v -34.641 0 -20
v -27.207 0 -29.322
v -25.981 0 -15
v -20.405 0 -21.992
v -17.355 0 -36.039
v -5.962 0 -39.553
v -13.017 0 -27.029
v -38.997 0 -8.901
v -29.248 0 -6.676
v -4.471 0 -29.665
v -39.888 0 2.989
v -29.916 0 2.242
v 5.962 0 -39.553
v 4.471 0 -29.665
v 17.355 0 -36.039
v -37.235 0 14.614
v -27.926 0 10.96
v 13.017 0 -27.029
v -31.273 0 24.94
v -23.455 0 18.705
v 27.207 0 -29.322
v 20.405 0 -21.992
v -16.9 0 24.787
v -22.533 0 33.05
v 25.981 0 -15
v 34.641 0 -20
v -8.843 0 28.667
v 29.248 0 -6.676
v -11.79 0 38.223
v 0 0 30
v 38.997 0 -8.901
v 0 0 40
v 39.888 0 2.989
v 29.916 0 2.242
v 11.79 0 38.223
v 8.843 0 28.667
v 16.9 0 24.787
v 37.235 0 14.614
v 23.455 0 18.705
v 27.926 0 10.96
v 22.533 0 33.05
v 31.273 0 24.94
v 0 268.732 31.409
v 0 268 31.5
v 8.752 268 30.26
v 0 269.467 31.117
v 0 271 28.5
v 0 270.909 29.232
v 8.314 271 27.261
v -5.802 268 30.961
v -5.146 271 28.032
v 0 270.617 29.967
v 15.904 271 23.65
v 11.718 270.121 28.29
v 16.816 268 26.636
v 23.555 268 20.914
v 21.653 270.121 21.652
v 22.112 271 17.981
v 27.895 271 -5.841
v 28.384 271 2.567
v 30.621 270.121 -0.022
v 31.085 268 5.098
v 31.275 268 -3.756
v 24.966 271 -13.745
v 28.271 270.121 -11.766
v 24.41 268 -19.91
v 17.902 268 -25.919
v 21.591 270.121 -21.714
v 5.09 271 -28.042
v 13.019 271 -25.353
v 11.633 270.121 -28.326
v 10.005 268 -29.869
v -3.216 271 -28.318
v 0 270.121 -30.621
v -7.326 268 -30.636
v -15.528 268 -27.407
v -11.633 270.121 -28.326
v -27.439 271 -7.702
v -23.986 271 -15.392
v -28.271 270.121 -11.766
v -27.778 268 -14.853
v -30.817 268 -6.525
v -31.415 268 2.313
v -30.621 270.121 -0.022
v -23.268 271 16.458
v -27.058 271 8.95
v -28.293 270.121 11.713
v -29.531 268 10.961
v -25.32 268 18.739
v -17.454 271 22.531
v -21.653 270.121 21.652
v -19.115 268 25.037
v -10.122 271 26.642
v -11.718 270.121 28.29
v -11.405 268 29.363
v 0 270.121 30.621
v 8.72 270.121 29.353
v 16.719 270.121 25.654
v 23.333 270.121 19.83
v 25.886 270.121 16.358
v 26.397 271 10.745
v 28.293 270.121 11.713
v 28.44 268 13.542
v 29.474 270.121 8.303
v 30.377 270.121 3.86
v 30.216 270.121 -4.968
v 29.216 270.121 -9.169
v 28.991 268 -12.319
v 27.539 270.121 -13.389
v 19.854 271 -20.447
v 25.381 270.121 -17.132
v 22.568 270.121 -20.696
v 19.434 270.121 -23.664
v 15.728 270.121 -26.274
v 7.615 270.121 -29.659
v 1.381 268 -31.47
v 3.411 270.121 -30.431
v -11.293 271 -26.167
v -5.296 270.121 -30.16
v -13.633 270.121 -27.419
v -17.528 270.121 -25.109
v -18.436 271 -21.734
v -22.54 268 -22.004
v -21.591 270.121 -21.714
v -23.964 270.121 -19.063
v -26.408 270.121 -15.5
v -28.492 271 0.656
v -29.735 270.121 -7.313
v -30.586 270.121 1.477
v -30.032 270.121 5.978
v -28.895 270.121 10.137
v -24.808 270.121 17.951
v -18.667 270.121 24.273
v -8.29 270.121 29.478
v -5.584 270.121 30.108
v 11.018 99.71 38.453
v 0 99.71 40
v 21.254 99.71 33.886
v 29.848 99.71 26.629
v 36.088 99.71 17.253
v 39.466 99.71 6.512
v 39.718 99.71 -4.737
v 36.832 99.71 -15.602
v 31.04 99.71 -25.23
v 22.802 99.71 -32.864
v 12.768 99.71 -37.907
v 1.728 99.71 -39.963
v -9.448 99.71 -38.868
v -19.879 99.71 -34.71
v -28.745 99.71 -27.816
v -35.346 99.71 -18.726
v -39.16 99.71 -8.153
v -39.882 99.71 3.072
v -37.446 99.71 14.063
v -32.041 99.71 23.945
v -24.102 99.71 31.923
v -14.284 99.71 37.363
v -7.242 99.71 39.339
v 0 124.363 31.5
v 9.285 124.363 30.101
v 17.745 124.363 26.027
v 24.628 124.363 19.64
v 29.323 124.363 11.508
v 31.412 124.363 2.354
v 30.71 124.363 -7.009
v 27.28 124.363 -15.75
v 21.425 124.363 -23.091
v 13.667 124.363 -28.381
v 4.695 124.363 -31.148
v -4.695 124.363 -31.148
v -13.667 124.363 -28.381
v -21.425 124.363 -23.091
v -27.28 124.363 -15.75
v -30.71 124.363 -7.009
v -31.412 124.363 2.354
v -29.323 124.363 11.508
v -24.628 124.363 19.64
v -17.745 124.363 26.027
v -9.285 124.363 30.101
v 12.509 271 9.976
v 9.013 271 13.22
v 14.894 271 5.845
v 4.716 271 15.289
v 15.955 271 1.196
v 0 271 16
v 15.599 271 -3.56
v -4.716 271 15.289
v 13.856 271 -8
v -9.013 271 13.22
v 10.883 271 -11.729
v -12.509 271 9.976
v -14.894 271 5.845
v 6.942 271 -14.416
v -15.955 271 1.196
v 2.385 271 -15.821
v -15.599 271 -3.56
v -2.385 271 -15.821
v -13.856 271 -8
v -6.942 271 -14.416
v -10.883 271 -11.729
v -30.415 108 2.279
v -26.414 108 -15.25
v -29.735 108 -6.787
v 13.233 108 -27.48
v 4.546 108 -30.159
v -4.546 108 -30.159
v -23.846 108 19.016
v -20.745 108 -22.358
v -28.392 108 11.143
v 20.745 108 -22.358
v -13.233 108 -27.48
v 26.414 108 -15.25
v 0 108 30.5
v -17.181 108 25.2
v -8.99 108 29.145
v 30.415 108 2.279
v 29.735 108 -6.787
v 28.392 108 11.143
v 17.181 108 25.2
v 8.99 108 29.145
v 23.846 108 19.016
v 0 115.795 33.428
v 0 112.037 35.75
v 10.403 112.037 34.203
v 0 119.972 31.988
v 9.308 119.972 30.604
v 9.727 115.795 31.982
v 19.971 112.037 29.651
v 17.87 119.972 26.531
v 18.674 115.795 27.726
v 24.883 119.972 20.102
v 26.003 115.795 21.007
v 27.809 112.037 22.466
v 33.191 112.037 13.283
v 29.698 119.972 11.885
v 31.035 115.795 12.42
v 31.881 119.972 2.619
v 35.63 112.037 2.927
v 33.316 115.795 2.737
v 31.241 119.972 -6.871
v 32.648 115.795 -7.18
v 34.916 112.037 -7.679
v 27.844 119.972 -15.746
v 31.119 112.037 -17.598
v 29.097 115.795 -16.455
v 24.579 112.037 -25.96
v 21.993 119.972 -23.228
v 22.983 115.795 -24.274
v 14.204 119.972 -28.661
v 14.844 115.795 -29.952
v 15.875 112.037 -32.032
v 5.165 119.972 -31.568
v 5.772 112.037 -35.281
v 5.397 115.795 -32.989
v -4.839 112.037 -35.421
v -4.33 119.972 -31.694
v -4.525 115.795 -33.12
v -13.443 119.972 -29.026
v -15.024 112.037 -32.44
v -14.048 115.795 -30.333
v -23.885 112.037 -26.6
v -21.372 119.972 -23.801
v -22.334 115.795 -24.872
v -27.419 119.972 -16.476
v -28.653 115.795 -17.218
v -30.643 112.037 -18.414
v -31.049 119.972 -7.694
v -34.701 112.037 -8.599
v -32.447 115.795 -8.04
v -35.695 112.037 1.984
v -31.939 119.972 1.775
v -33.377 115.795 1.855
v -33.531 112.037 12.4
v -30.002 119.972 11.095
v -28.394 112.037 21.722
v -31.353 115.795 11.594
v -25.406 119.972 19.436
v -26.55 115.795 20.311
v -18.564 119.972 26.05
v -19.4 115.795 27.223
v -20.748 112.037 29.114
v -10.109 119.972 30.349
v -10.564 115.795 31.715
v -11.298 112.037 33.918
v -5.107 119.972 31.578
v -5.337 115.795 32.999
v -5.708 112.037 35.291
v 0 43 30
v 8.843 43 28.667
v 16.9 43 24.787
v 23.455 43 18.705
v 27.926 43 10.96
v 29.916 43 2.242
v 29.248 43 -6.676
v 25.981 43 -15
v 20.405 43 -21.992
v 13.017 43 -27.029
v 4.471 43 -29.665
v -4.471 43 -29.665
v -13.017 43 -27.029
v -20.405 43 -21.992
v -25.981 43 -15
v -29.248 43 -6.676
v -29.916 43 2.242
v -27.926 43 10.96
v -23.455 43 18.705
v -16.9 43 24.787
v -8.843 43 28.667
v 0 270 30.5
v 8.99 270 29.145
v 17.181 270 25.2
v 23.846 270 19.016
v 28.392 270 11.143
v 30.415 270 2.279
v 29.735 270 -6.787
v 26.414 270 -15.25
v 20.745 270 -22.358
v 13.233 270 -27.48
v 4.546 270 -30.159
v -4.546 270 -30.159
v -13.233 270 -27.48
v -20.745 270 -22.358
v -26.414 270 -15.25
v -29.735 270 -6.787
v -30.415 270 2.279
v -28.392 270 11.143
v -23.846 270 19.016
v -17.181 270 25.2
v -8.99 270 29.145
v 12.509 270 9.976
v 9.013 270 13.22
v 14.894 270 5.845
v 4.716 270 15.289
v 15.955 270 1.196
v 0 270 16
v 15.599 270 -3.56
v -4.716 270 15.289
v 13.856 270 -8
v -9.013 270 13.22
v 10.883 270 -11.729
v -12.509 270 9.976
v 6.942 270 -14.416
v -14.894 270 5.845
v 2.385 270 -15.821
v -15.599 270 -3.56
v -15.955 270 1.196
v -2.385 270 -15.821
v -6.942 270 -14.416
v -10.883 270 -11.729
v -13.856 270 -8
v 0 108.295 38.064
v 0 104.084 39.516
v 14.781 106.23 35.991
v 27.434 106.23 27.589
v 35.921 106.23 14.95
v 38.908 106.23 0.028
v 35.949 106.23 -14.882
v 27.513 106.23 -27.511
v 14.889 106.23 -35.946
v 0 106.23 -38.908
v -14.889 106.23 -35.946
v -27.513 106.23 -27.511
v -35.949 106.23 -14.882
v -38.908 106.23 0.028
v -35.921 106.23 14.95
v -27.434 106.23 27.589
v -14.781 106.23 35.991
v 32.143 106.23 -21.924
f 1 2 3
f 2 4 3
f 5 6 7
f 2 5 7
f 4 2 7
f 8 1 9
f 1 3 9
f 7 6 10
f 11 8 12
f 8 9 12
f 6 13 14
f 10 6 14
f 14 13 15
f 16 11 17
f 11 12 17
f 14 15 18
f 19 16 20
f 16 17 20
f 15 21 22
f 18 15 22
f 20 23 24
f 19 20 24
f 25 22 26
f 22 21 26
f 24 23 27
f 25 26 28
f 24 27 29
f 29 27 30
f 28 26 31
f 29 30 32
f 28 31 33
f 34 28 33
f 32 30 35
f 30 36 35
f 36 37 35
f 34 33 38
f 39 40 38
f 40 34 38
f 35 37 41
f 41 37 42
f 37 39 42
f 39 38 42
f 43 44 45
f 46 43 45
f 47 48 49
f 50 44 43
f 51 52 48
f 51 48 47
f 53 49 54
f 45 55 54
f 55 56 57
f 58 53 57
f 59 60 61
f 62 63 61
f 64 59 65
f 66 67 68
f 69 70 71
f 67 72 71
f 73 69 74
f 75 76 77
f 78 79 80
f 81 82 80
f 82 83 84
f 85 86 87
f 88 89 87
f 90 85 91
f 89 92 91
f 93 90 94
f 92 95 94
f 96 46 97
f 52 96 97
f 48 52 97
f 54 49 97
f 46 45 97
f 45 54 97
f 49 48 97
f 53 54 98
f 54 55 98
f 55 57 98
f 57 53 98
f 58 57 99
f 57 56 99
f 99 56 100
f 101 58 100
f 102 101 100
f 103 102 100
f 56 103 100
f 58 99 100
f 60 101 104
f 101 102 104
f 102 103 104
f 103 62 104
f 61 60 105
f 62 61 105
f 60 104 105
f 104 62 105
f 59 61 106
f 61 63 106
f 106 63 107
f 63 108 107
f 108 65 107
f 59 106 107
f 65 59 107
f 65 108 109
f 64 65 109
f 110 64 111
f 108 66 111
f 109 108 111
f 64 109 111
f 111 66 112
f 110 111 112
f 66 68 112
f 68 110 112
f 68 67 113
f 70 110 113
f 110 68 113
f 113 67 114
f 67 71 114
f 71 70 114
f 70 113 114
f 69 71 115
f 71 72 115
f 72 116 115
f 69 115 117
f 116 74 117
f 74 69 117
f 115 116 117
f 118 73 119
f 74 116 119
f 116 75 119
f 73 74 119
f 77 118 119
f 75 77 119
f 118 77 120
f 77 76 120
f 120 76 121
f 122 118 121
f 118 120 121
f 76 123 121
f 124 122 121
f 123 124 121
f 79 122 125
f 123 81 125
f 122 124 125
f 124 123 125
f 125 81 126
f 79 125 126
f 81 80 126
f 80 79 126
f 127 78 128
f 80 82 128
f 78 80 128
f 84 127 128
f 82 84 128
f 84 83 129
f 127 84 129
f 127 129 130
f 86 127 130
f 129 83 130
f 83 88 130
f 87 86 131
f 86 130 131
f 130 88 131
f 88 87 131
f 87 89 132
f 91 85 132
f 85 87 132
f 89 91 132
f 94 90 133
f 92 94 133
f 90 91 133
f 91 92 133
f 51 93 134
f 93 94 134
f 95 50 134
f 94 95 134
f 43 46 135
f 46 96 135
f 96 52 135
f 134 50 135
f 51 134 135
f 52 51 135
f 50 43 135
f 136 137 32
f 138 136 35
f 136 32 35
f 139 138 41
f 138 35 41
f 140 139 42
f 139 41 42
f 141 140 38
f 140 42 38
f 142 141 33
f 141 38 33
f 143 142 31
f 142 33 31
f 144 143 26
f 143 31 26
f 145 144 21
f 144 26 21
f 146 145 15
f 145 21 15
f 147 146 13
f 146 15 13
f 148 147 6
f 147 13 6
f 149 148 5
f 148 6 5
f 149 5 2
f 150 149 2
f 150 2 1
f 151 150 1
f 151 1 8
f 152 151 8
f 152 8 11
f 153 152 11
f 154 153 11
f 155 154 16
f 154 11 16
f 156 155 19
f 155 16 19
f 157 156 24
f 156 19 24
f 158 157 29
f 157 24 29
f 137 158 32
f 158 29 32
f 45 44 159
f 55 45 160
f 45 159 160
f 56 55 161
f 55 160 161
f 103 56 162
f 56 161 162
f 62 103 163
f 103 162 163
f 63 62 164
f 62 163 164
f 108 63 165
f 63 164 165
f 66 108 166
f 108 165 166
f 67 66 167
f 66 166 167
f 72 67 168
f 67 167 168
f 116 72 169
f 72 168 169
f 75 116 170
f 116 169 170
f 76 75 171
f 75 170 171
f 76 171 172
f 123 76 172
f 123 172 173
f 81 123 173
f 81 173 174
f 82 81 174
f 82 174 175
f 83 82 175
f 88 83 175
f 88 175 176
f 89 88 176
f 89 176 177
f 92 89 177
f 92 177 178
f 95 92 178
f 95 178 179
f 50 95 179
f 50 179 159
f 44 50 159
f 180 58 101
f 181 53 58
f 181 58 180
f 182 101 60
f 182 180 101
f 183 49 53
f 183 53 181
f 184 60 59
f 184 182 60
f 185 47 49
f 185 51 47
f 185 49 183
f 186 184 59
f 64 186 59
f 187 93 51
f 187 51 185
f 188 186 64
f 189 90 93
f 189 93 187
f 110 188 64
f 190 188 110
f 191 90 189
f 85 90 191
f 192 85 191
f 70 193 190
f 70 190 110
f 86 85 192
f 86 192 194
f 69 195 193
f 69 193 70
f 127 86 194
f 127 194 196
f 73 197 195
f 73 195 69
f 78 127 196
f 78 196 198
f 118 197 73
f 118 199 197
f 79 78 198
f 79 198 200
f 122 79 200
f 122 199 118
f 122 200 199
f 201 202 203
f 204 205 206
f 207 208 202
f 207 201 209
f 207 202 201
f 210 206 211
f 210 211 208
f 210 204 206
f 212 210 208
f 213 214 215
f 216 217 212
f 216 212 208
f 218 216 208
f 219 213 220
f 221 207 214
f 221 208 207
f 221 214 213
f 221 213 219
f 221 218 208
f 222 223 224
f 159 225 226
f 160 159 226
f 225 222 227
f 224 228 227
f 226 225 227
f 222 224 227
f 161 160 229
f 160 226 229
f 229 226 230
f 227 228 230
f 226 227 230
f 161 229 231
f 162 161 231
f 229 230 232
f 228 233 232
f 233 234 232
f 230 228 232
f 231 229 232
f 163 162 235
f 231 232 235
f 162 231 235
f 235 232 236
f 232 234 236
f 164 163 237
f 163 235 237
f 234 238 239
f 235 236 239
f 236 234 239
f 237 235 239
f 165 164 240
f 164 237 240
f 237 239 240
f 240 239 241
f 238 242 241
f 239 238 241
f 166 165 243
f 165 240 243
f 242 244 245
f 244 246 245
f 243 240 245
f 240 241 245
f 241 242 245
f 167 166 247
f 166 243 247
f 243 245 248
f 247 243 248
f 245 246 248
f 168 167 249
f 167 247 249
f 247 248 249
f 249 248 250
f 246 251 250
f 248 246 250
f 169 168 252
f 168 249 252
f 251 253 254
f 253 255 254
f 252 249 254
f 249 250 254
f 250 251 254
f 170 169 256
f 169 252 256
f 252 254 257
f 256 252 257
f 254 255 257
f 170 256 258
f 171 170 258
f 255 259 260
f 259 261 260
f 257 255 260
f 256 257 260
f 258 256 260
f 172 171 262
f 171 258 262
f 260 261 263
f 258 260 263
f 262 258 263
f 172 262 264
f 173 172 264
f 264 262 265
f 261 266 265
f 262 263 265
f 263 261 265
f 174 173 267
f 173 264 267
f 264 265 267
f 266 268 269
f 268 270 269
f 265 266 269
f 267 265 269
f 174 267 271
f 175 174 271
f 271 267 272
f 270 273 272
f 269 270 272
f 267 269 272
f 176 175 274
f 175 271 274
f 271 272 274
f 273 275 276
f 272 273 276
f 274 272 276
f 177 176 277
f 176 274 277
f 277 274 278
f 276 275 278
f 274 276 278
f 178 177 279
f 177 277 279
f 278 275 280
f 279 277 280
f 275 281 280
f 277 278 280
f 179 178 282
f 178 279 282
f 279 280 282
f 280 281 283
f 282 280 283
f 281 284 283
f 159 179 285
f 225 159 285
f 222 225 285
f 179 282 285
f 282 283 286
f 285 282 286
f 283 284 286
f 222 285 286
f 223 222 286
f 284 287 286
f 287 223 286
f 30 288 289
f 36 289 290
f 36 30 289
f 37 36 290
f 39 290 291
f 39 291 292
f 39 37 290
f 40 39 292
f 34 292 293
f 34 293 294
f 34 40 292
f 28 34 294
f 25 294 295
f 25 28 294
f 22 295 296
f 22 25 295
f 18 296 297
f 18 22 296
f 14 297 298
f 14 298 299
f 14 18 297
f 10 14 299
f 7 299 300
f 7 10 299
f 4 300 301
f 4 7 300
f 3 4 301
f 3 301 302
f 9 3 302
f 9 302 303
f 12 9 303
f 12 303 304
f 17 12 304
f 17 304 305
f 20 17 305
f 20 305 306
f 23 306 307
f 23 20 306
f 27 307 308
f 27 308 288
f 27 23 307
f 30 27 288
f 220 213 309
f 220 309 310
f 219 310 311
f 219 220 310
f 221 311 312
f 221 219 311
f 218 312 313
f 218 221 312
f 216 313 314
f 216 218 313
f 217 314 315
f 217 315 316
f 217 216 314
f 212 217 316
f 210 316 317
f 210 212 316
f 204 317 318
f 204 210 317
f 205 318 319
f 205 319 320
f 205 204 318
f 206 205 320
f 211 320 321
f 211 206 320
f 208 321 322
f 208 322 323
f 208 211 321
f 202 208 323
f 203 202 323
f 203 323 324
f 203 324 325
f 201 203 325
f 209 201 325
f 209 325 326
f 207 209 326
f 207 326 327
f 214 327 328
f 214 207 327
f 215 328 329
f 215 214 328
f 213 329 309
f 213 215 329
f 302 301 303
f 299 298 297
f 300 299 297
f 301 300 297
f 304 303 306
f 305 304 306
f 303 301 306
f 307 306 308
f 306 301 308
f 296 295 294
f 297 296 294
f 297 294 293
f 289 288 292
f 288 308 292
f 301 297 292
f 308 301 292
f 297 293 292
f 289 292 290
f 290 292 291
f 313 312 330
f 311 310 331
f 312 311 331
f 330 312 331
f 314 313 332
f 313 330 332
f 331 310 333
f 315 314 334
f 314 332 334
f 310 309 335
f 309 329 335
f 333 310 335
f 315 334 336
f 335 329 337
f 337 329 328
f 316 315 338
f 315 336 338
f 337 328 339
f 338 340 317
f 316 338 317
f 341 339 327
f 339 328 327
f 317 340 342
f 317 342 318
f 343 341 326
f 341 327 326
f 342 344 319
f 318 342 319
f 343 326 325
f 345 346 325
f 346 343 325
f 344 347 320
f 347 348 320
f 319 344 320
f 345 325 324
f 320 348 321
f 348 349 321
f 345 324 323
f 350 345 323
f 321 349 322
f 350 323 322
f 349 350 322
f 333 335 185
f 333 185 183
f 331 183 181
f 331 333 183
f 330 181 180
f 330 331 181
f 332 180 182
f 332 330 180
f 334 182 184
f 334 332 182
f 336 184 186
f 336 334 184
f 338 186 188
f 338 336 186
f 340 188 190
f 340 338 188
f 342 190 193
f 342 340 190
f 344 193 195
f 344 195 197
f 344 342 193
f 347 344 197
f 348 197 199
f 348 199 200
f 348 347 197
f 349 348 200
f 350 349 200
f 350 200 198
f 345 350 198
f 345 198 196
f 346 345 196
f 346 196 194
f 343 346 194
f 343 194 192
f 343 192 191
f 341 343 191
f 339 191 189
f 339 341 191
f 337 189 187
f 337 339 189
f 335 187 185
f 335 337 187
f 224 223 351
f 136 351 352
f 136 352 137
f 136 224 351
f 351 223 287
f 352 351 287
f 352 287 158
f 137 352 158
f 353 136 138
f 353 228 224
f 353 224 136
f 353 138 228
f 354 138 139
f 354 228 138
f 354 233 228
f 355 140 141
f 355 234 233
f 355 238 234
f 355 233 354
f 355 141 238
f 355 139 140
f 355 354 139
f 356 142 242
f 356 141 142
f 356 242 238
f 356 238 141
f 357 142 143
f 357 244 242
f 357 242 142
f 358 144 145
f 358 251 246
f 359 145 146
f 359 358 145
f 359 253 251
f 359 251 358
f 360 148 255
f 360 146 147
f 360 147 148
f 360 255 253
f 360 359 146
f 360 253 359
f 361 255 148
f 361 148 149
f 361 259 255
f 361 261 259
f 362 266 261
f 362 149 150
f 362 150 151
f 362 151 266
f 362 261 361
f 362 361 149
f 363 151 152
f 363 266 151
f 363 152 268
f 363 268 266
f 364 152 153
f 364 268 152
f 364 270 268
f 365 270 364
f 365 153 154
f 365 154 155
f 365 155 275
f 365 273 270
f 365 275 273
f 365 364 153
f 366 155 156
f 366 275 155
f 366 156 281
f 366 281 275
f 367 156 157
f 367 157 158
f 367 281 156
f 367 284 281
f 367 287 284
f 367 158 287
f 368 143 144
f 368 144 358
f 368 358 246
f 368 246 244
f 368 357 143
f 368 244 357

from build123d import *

# Parameters (mm, degrees)
SKETCH_1_R      = 40
SKETCH_1_R_2    = 30
EXTRUDE_1_DEPTH = 43
SKETCH_2_R      = 40
EXTRUDE_2_DEPTH = 65
SKETCH_3_R      = 31.5
SKETCH_3_R_2    = 30.5
EXTRUDE_3_DEPTH = 162
FILLET_1_R      = 20
FILLET_2_R      = 20
SKETCH_4_R      = 31.5
SKETCH_4_R_2    = 16
EXTRUDE_4_DEPTH = 1
FILLET_3_R      = 3


with BuildPart() as part:
    # Эскиз1 → Вытянуть1 (new body)
    with BuildSketch(Plane(origin=(0, 0, 0), x_dir=(1, 0, 0), z_dir=(0, 1, 0))):
        with Locations(Location((0, 0, 0), (0, 0, 270))):
            Circle(SKETCH_1_R)
        with Locations(Location((0, 0, 0), (0, 0, 270))):
            Circle(SKETCH_1_R_2, mode=Mode.SUBTRACT)
    extrude(amount=EXTRUDE_1_DEPTH)

    # Эскиз2 → Вытянуть2 (add)
    with BuildSketch(Plane(origin=(0, 43, 0), x_dir=(1, 0, 0), z_dir=(0, 1, 0))):
        with Locations(Location((0, 0, 0), (0, 0, 270))):
            Circle(SKETCH_2_R)
    extrude(amount=EXTRUDE_2_DEPTH)

    # Эскиз3 → Вытянуть3 (add)
    with BuildSketch(Plane(origin=(0, 108, 0), x_dir=(-1, 0, 0), z_dir=(0, 1, 0))):
        with Locations(Location((0, 0, 0), (0, 0, 90))):
            Circle(SKETCH_3_R)
        with Locations(Location((0, 0, 0), (0, 0, 90))):
            Circle(SKETCH_3_R_2, mode=Mode.SUBTRACT)
    extrude(amount=EXTRUDE_3_DEPTH)

    # Скругление1
    # the kernel refuses this fillet: 20 mm, written as the material it adds along each edge
    with BuildSketch(Plane(origin=(0, 108, 0), x_dir=(0, 0, 1), z_dir=(-1, 0, 0))) as fillet_1_piece_1:
        with BuildLine():
            CenterArc((51.5, 16.363068172), FILLET_1_R, 180, 54.900367805)
            Line((31.5, 16.363068172), (31.1, 16.363068172))
            Line((31.1, 16.363068172), (31.1, 0))
            Line((31.1, 0), (31.5, -0.4))
            ThreePointArc((31.5, -0.4), (35.75, -0.4), (39.77, -0.327261363))
            Line((39.77, -0.327261363), (40, 0))
        make_face()
    revolve(axis=Axis((0, 108, 0), (0, 1, 0)))

    # Скругление2
    fillet_2_edges = [part.edges().sort_by_distance(p)[0] for p in [
        (0, 108, -40),
    ]]
    fillet(fillet_2_edges, radius=FILLET_2_R)

    # Эскиз4 → Вытянуть4 (add)
    with BuildSketch(Plane(origin=(0, 270, 0), x_dir=(-1, 0, 0), z_dir=(0, 1, 0))):
        with Locations(Location((0, 0, 0), (0, 0, 270))):
            Circle(SKETCH_4_R)
        with Locations(Location((0, 0, 0), (0, 0, 90))):
            Circle(SKETCH_4_R_2, mode=Mode.SUBTRACT)
    extrude(amount=EXTRUDE_4_DEPTH)

    # Скругление3
    fillet_3_edges = [part.edges().sort_by_distance(p)[0] for p in [
        (0, 271, 31.5),
    ]]
    fillet(fillet_3_edges, radius=FILLET_3_R)


solid = part.part
